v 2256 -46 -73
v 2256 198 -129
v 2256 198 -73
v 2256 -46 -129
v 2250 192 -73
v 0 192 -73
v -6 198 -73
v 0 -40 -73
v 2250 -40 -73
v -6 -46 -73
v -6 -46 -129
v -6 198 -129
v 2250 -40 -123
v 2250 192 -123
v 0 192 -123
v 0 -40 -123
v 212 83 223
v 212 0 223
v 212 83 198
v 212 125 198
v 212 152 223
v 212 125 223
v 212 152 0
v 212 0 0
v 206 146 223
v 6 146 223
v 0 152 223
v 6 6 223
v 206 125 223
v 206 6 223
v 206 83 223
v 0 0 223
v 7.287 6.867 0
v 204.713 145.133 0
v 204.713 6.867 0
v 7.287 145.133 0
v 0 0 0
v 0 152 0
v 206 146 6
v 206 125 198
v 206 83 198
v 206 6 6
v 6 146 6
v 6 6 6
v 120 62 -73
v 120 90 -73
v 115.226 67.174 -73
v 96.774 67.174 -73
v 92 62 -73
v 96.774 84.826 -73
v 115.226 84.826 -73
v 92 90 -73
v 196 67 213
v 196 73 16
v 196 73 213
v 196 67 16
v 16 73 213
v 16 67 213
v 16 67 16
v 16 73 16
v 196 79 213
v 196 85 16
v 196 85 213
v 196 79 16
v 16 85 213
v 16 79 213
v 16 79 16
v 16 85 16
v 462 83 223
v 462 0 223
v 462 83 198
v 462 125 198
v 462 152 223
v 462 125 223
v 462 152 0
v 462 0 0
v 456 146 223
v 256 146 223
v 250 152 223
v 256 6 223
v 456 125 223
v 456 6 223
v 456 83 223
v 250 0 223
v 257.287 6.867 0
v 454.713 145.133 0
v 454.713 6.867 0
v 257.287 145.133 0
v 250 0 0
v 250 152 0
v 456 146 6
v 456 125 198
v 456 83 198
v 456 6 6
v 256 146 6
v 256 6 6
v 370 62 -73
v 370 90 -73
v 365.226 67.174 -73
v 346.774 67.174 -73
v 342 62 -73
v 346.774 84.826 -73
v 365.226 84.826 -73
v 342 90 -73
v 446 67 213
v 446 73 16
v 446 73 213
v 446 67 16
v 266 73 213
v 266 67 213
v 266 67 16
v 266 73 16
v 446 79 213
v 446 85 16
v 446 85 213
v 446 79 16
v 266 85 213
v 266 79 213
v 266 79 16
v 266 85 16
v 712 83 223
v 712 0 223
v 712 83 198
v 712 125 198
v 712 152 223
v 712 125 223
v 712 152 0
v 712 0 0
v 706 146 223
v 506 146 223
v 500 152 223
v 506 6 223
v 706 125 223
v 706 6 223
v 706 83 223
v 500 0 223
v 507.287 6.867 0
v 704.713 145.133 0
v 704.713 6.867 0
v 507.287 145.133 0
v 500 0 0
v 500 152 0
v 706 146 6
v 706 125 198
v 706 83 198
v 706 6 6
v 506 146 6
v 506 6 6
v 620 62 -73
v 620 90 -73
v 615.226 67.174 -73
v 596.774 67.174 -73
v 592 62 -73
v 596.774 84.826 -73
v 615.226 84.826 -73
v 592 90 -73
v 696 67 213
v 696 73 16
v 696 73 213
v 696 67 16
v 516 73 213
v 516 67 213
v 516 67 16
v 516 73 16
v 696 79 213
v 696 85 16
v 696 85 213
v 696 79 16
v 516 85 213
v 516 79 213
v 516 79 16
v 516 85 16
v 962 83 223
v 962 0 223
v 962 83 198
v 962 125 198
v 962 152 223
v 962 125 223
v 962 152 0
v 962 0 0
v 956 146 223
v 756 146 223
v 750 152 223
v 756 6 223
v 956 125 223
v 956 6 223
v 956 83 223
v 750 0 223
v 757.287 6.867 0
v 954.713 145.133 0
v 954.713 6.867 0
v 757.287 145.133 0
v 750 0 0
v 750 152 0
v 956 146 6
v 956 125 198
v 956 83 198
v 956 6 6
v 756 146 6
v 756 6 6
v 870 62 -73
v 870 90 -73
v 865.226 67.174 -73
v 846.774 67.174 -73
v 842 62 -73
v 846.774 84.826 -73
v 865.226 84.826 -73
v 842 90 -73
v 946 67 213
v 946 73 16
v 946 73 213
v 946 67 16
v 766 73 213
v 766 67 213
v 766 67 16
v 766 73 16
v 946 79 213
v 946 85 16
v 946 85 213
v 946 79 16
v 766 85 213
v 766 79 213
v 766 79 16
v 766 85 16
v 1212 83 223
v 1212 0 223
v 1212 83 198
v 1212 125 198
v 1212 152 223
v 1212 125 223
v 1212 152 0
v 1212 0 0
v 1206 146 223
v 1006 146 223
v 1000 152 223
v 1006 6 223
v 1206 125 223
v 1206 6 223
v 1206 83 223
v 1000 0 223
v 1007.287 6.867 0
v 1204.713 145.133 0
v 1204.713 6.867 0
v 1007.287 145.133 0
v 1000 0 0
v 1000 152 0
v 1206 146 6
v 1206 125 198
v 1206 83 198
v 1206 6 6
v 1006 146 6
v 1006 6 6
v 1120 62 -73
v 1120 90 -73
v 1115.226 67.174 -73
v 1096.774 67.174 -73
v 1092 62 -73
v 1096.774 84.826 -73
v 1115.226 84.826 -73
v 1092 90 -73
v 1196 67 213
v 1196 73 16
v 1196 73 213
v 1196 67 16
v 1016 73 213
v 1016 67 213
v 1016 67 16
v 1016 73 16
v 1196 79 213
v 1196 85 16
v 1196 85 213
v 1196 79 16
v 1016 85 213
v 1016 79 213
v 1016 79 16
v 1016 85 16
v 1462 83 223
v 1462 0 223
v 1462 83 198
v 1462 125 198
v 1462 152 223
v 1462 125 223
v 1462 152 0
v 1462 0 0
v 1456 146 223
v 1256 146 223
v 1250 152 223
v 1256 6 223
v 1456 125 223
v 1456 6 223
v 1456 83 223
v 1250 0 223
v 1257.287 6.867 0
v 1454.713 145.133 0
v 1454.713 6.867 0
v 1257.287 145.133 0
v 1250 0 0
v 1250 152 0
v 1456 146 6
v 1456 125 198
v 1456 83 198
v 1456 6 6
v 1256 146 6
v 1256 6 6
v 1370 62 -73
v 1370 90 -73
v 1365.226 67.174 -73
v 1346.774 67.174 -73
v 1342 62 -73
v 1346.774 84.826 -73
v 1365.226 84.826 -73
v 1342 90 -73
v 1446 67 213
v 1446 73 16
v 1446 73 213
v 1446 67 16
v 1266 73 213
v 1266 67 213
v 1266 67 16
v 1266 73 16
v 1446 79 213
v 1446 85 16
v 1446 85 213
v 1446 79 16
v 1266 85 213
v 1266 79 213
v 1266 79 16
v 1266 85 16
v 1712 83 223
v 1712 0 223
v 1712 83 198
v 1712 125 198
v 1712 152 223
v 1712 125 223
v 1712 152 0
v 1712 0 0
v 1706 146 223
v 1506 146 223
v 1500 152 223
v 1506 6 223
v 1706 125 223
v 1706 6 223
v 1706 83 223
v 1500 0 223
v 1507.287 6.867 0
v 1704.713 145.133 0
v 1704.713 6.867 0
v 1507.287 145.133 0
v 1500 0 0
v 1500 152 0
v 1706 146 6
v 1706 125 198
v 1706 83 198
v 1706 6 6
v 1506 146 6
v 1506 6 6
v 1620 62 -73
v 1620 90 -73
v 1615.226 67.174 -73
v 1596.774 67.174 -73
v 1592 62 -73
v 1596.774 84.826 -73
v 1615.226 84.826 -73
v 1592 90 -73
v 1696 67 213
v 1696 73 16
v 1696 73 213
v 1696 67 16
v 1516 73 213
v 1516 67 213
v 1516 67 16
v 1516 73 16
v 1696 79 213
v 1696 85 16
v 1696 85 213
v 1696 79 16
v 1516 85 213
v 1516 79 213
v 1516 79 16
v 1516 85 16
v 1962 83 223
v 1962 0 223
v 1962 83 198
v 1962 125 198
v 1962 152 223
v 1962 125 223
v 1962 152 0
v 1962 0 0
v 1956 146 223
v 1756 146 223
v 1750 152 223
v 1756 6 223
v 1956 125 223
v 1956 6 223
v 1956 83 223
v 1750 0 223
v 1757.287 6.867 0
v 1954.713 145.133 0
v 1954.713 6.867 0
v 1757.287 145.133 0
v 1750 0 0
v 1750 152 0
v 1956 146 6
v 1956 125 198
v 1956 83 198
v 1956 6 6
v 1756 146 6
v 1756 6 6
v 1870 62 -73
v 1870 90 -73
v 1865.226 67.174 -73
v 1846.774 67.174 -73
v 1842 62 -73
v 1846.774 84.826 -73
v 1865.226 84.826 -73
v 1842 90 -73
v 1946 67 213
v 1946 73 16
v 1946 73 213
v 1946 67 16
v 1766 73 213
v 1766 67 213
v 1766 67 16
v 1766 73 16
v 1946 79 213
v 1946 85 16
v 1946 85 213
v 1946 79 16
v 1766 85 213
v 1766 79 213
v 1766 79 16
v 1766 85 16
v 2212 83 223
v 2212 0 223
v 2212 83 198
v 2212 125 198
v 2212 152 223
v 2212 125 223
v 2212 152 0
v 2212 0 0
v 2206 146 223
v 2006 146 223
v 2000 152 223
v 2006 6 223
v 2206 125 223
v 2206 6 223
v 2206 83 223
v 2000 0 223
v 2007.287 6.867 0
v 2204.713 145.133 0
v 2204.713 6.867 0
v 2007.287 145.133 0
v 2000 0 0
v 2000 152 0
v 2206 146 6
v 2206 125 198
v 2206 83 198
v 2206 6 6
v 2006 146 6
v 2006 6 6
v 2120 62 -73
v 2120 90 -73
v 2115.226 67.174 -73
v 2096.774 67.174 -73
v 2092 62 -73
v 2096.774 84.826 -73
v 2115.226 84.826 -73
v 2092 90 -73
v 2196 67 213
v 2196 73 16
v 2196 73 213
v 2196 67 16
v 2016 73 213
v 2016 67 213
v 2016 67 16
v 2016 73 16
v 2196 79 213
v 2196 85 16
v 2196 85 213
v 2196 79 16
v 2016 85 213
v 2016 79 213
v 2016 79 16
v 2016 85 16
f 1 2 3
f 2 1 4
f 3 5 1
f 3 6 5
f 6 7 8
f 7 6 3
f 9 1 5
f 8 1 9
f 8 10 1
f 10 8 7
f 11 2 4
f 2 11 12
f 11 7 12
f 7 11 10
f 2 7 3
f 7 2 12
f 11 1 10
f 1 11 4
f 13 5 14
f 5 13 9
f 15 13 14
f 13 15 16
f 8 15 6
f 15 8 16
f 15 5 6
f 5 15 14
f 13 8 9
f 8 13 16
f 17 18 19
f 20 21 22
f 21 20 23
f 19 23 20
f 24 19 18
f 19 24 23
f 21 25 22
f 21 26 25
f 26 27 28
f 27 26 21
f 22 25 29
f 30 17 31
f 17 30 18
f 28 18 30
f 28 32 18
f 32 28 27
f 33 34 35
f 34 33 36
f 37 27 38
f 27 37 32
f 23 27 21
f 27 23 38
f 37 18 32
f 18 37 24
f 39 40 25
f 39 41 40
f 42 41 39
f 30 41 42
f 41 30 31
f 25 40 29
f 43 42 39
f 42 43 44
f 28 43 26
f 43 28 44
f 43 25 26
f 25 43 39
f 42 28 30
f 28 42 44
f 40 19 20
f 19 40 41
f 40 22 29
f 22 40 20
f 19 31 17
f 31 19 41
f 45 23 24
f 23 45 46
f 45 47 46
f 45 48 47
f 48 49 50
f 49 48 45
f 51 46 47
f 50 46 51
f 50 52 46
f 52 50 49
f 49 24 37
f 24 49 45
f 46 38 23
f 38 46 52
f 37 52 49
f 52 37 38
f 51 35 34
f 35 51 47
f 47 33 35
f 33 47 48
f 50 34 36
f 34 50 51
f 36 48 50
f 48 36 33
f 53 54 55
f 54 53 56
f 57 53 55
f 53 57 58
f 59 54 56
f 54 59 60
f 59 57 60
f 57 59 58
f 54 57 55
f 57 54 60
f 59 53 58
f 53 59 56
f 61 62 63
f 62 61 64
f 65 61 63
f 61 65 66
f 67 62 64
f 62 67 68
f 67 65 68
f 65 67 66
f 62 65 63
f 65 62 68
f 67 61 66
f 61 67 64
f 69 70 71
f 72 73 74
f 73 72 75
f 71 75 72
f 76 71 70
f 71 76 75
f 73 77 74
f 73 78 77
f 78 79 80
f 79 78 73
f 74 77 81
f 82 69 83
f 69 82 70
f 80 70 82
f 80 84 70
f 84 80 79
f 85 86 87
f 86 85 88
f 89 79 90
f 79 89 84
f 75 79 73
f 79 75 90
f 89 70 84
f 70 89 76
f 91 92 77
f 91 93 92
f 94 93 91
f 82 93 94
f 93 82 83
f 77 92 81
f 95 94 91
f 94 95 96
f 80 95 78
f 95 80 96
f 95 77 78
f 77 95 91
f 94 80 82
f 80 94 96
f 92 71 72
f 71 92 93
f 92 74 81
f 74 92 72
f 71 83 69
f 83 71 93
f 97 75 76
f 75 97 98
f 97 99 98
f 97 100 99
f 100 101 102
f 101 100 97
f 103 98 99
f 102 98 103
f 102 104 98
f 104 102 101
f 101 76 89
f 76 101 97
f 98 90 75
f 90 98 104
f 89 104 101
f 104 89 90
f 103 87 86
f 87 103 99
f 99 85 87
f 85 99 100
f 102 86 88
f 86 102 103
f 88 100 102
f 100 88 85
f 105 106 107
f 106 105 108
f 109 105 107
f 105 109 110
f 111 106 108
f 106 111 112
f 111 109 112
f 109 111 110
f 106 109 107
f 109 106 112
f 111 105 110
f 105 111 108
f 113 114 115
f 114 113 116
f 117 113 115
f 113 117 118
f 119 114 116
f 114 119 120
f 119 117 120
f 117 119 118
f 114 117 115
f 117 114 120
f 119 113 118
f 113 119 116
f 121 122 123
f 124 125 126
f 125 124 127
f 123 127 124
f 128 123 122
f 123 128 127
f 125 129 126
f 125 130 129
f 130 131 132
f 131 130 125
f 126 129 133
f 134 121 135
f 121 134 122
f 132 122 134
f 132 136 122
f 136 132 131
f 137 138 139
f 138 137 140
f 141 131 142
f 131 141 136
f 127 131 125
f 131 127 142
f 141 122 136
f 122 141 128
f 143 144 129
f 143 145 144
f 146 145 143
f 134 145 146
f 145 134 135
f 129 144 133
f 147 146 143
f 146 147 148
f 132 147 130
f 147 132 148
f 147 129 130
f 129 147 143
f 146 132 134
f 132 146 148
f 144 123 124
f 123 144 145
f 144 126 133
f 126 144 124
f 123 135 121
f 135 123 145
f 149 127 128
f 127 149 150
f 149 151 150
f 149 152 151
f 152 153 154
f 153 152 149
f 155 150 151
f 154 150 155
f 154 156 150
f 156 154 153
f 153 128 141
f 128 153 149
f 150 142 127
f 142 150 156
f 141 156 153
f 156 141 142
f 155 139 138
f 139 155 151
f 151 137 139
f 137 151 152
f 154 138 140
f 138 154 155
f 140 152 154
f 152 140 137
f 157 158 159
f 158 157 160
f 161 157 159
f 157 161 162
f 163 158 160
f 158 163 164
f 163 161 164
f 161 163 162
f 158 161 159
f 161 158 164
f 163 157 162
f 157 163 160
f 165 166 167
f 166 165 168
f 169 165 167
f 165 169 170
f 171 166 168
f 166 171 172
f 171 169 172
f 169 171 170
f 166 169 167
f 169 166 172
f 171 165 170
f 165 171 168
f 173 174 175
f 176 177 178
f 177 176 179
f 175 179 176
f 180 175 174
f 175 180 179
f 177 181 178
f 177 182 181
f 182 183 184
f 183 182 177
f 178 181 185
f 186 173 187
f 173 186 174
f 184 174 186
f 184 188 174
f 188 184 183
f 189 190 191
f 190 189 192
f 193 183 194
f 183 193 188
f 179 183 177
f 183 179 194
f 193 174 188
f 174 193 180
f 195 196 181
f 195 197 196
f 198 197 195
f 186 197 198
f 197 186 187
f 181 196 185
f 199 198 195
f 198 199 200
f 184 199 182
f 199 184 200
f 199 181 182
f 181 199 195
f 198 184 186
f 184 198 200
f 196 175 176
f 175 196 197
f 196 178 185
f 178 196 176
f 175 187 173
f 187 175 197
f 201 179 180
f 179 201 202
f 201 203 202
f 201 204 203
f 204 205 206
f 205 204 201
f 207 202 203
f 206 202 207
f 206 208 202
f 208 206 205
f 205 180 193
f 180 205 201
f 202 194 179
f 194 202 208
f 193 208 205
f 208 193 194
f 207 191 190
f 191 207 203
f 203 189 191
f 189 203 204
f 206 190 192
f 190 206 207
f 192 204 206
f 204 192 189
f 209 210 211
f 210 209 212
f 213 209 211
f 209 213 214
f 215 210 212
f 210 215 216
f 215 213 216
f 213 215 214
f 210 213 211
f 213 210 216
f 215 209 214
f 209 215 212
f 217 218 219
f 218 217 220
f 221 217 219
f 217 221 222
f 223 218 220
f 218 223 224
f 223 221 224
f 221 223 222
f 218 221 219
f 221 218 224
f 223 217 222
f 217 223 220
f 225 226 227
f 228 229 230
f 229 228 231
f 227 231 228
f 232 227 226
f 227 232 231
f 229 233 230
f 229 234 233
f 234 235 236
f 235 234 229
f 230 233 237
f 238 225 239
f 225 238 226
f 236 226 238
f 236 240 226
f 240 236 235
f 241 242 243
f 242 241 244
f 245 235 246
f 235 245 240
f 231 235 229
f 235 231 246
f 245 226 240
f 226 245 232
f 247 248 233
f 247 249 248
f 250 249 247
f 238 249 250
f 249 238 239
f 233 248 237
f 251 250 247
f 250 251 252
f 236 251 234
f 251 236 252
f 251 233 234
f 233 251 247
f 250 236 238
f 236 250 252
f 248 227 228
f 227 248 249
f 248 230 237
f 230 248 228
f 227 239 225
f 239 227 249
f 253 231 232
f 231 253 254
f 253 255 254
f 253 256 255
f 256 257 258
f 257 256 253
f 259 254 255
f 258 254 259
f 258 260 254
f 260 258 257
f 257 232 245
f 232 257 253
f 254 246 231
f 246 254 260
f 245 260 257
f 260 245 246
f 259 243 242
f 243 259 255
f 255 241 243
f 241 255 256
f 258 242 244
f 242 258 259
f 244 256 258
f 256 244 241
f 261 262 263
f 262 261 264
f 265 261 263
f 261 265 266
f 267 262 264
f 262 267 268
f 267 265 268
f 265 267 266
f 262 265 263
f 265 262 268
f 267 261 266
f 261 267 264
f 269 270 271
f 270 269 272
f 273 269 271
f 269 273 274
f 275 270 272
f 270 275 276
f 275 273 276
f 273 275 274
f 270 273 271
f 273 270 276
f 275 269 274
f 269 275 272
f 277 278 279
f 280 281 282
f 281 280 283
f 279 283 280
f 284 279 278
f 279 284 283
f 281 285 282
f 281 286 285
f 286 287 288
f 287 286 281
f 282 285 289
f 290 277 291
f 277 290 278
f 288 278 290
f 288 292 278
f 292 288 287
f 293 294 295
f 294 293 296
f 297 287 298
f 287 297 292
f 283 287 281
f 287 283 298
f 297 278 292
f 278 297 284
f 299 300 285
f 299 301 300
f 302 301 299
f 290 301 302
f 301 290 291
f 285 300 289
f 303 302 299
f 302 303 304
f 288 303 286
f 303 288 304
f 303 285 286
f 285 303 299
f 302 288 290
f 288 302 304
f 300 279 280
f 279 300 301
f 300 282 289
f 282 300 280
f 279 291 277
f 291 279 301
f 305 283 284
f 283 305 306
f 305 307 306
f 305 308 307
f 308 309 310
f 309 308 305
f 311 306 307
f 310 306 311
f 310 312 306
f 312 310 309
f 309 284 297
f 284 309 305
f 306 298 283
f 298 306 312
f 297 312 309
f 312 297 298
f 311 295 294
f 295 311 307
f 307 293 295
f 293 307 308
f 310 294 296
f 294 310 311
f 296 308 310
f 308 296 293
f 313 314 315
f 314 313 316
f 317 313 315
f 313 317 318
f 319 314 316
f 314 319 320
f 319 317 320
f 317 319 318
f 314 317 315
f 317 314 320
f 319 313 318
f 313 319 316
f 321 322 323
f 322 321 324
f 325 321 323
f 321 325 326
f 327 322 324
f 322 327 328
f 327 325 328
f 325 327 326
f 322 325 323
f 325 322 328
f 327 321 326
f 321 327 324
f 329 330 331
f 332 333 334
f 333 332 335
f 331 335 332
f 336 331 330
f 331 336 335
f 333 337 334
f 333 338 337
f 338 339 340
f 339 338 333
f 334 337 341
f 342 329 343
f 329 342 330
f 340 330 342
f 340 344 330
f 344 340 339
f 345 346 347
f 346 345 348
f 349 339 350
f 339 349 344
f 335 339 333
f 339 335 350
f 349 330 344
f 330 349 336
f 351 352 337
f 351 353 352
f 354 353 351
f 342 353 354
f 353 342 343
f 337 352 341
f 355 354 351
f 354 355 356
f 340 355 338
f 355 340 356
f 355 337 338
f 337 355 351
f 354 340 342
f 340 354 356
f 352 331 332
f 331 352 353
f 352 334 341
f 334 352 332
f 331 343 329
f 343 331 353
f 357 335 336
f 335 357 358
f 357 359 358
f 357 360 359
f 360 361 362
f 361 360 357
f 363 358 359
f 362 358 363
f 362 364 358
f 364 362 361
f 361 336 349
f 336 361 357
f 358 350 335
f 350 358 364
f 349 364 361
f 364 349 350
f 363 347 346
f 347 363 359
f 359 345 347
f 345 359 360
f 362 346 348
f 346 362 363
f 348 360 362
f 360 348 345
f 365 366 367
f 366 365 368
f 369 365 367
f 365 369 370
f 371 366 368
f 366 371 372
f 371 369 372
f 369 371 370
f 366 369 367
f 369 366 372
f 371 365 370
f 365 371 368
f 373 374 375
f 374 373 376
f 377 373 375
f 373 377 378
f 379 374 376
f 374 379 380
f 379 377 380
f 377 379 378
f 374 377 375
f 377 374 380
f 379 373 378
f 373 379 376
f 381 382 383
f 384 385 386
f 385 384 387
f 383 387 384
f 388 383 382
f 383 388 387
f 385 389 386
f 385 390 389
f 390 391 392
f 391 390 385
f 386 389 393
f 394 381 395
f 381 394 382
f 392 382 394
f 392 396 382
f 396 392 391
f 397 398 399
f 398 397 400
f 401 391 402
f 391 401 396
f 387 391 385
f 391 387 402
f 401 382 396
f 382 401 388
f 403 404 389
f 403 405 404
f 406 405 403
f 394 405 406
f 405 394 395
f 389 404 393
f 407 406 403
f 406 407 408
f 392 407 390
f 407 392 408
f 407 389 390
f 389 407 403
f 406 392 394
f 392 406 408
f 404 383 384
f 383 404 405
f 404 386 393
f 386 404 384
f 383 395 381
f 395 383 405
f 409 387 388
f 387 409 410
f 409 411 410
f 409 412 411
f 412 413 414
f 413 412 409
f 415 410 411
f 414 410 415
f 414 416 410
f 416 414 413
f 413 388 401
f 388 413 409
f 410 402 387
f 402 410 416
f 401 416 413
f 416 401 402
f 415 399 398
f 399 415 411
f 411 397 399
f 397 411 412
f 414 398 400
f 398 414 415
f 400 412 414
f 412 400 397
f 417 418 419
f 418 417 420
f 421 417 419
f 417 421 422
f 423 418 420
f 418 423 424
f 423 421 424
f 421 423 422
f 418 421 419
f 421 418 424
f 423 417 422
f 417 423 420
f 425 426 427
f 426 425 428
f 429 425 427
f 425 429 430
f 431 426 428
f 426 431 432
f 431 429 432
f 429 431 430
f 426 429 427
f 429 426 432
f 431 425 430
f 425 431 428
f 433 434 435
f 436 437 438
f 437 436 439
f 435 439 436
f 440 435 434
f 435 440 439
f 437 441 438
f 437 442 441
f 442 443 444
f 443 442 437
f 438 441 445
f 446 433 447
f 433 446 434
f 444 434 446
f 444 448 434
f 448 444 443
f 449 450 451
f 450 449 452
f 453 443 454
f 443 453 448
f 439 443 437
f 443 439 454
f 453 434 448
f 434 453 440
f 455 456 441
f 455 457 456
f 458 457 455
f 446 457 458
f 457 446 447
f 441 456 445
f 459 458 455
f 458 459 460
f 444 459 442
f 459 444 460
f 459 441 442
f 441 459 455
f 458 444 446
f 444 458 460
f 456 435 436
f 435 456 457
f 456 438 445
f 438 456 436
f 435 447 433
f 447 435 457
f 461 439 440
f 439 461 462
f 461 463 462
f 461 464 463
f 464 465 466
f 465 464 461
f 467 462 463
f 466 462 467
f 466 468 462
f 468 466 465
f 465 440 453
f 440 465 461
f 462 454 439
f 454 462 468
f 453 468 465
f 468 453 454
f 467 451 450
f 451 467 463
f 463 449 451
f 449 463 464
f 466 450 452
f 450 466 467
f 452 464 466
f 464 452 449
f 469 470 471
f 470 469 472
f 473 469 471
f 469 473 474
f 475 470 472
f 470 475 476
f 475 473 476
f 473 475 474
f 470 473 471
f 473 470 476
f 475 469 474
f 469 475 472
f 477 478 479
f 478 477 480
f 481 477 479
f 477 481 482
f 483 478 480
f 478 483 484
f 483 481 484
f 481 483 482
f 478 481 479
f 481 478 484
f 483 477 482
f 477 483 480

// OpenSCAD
// file: params.scad
// 1:3 foam-board EW cascade. Lockstep with params.py.
SCALE     = 1/3;
T         = 6;
TAB       = 12;
ID_L      = 200;
ID_W      = 140;
ID_H      = 217;
FUNNEL_H  = 73;
PITCH     = 250;
BUND_H    = 50;
BUND_PAD  = 40;
THROAT    = 16;
SLOT      = T;
OD_L      = ID_L + 2*T;
OD_W      = ID_W + 2*T;
N_CELLS   = 9;
$fn = 24;
// main file
// Assembled 1:3 foam-board EW cascade. Operator OpenSCAD.
// Flat patterns and nest come from generate.py, not from this file.
include <params.scad>;

module wall_box() {
    difference() {
        cube([OD_L, OD_W, T + ID_H]);
        translate([T, T, T]) cube([ID_L, ID_W, ID_H + 1]);
        // overflow notch +X, cathode side of mid
        translate([OD_L - T - 1, T + ID_W*0.55, T + ID_H - 25])
            cube([T + 2, ID_W*0.30, 26]);
        // CEM slot
        translate([T + 10, T + ID_W/2 - SLOT/2, T])
            cube([ID_L - 20, SLOT, ID_H + 1]);
    }
}

module funnel() {
    top_l = OD_L; top_w = OD_W; bot = THROAT + 2*T;
    difference() {
        hull() {
            cube([top_l, top_w, 1]);
            translate([(top_l-bot)/2, (top_w-bot)/2, -FUNNEL_H])
                cube([bot, bot, 1]);
        }
        hull() {
            translate([T, T, 1.05]) cube([ID_L, ID_W, 1]);
            translate([(top_l-THROAT)/2, (top_w-THROAT)/2, -FUNNEL_H-1])
                cube([THROAT, THROAT, 1]);
        }
    }
}

module rib() {
    cube([ID_L - 20, T, ID_H - 20]);
}

module cell() {
    color("#f4f1ea") wall_box();
    color("#e7e2d6") funnel();
    color("#93c5fd")
        translate([T + 10, T + ID_W/2 - SLOT/2 - T, T + 10]) rib();
    color("#fdba74")
        translate([T + 10, T + ID_W/2 + SLOT/2, T + 10]) rib();
}

module bund() {
    L = N_CELLS * PITCH + 2*T;
    W = AISLE_W + 2*T;
    difference() {
        cube([L, W, T + BUND_H]);
        translate([T, T, T]) cube([L - 2*T, W - 2*T, BUND_H + 1]);
    }
}

AISLE_W = OD_W + 2*BUND_PAD;

translate([-T, -BUND_PAD - T, -FUNNEL_H - T - BUND_H])
    color("#d6d3d1") bund();

for (i = [0:N_CELLS-1])
    translate([i * PITCH, 0, 0]) cell();
